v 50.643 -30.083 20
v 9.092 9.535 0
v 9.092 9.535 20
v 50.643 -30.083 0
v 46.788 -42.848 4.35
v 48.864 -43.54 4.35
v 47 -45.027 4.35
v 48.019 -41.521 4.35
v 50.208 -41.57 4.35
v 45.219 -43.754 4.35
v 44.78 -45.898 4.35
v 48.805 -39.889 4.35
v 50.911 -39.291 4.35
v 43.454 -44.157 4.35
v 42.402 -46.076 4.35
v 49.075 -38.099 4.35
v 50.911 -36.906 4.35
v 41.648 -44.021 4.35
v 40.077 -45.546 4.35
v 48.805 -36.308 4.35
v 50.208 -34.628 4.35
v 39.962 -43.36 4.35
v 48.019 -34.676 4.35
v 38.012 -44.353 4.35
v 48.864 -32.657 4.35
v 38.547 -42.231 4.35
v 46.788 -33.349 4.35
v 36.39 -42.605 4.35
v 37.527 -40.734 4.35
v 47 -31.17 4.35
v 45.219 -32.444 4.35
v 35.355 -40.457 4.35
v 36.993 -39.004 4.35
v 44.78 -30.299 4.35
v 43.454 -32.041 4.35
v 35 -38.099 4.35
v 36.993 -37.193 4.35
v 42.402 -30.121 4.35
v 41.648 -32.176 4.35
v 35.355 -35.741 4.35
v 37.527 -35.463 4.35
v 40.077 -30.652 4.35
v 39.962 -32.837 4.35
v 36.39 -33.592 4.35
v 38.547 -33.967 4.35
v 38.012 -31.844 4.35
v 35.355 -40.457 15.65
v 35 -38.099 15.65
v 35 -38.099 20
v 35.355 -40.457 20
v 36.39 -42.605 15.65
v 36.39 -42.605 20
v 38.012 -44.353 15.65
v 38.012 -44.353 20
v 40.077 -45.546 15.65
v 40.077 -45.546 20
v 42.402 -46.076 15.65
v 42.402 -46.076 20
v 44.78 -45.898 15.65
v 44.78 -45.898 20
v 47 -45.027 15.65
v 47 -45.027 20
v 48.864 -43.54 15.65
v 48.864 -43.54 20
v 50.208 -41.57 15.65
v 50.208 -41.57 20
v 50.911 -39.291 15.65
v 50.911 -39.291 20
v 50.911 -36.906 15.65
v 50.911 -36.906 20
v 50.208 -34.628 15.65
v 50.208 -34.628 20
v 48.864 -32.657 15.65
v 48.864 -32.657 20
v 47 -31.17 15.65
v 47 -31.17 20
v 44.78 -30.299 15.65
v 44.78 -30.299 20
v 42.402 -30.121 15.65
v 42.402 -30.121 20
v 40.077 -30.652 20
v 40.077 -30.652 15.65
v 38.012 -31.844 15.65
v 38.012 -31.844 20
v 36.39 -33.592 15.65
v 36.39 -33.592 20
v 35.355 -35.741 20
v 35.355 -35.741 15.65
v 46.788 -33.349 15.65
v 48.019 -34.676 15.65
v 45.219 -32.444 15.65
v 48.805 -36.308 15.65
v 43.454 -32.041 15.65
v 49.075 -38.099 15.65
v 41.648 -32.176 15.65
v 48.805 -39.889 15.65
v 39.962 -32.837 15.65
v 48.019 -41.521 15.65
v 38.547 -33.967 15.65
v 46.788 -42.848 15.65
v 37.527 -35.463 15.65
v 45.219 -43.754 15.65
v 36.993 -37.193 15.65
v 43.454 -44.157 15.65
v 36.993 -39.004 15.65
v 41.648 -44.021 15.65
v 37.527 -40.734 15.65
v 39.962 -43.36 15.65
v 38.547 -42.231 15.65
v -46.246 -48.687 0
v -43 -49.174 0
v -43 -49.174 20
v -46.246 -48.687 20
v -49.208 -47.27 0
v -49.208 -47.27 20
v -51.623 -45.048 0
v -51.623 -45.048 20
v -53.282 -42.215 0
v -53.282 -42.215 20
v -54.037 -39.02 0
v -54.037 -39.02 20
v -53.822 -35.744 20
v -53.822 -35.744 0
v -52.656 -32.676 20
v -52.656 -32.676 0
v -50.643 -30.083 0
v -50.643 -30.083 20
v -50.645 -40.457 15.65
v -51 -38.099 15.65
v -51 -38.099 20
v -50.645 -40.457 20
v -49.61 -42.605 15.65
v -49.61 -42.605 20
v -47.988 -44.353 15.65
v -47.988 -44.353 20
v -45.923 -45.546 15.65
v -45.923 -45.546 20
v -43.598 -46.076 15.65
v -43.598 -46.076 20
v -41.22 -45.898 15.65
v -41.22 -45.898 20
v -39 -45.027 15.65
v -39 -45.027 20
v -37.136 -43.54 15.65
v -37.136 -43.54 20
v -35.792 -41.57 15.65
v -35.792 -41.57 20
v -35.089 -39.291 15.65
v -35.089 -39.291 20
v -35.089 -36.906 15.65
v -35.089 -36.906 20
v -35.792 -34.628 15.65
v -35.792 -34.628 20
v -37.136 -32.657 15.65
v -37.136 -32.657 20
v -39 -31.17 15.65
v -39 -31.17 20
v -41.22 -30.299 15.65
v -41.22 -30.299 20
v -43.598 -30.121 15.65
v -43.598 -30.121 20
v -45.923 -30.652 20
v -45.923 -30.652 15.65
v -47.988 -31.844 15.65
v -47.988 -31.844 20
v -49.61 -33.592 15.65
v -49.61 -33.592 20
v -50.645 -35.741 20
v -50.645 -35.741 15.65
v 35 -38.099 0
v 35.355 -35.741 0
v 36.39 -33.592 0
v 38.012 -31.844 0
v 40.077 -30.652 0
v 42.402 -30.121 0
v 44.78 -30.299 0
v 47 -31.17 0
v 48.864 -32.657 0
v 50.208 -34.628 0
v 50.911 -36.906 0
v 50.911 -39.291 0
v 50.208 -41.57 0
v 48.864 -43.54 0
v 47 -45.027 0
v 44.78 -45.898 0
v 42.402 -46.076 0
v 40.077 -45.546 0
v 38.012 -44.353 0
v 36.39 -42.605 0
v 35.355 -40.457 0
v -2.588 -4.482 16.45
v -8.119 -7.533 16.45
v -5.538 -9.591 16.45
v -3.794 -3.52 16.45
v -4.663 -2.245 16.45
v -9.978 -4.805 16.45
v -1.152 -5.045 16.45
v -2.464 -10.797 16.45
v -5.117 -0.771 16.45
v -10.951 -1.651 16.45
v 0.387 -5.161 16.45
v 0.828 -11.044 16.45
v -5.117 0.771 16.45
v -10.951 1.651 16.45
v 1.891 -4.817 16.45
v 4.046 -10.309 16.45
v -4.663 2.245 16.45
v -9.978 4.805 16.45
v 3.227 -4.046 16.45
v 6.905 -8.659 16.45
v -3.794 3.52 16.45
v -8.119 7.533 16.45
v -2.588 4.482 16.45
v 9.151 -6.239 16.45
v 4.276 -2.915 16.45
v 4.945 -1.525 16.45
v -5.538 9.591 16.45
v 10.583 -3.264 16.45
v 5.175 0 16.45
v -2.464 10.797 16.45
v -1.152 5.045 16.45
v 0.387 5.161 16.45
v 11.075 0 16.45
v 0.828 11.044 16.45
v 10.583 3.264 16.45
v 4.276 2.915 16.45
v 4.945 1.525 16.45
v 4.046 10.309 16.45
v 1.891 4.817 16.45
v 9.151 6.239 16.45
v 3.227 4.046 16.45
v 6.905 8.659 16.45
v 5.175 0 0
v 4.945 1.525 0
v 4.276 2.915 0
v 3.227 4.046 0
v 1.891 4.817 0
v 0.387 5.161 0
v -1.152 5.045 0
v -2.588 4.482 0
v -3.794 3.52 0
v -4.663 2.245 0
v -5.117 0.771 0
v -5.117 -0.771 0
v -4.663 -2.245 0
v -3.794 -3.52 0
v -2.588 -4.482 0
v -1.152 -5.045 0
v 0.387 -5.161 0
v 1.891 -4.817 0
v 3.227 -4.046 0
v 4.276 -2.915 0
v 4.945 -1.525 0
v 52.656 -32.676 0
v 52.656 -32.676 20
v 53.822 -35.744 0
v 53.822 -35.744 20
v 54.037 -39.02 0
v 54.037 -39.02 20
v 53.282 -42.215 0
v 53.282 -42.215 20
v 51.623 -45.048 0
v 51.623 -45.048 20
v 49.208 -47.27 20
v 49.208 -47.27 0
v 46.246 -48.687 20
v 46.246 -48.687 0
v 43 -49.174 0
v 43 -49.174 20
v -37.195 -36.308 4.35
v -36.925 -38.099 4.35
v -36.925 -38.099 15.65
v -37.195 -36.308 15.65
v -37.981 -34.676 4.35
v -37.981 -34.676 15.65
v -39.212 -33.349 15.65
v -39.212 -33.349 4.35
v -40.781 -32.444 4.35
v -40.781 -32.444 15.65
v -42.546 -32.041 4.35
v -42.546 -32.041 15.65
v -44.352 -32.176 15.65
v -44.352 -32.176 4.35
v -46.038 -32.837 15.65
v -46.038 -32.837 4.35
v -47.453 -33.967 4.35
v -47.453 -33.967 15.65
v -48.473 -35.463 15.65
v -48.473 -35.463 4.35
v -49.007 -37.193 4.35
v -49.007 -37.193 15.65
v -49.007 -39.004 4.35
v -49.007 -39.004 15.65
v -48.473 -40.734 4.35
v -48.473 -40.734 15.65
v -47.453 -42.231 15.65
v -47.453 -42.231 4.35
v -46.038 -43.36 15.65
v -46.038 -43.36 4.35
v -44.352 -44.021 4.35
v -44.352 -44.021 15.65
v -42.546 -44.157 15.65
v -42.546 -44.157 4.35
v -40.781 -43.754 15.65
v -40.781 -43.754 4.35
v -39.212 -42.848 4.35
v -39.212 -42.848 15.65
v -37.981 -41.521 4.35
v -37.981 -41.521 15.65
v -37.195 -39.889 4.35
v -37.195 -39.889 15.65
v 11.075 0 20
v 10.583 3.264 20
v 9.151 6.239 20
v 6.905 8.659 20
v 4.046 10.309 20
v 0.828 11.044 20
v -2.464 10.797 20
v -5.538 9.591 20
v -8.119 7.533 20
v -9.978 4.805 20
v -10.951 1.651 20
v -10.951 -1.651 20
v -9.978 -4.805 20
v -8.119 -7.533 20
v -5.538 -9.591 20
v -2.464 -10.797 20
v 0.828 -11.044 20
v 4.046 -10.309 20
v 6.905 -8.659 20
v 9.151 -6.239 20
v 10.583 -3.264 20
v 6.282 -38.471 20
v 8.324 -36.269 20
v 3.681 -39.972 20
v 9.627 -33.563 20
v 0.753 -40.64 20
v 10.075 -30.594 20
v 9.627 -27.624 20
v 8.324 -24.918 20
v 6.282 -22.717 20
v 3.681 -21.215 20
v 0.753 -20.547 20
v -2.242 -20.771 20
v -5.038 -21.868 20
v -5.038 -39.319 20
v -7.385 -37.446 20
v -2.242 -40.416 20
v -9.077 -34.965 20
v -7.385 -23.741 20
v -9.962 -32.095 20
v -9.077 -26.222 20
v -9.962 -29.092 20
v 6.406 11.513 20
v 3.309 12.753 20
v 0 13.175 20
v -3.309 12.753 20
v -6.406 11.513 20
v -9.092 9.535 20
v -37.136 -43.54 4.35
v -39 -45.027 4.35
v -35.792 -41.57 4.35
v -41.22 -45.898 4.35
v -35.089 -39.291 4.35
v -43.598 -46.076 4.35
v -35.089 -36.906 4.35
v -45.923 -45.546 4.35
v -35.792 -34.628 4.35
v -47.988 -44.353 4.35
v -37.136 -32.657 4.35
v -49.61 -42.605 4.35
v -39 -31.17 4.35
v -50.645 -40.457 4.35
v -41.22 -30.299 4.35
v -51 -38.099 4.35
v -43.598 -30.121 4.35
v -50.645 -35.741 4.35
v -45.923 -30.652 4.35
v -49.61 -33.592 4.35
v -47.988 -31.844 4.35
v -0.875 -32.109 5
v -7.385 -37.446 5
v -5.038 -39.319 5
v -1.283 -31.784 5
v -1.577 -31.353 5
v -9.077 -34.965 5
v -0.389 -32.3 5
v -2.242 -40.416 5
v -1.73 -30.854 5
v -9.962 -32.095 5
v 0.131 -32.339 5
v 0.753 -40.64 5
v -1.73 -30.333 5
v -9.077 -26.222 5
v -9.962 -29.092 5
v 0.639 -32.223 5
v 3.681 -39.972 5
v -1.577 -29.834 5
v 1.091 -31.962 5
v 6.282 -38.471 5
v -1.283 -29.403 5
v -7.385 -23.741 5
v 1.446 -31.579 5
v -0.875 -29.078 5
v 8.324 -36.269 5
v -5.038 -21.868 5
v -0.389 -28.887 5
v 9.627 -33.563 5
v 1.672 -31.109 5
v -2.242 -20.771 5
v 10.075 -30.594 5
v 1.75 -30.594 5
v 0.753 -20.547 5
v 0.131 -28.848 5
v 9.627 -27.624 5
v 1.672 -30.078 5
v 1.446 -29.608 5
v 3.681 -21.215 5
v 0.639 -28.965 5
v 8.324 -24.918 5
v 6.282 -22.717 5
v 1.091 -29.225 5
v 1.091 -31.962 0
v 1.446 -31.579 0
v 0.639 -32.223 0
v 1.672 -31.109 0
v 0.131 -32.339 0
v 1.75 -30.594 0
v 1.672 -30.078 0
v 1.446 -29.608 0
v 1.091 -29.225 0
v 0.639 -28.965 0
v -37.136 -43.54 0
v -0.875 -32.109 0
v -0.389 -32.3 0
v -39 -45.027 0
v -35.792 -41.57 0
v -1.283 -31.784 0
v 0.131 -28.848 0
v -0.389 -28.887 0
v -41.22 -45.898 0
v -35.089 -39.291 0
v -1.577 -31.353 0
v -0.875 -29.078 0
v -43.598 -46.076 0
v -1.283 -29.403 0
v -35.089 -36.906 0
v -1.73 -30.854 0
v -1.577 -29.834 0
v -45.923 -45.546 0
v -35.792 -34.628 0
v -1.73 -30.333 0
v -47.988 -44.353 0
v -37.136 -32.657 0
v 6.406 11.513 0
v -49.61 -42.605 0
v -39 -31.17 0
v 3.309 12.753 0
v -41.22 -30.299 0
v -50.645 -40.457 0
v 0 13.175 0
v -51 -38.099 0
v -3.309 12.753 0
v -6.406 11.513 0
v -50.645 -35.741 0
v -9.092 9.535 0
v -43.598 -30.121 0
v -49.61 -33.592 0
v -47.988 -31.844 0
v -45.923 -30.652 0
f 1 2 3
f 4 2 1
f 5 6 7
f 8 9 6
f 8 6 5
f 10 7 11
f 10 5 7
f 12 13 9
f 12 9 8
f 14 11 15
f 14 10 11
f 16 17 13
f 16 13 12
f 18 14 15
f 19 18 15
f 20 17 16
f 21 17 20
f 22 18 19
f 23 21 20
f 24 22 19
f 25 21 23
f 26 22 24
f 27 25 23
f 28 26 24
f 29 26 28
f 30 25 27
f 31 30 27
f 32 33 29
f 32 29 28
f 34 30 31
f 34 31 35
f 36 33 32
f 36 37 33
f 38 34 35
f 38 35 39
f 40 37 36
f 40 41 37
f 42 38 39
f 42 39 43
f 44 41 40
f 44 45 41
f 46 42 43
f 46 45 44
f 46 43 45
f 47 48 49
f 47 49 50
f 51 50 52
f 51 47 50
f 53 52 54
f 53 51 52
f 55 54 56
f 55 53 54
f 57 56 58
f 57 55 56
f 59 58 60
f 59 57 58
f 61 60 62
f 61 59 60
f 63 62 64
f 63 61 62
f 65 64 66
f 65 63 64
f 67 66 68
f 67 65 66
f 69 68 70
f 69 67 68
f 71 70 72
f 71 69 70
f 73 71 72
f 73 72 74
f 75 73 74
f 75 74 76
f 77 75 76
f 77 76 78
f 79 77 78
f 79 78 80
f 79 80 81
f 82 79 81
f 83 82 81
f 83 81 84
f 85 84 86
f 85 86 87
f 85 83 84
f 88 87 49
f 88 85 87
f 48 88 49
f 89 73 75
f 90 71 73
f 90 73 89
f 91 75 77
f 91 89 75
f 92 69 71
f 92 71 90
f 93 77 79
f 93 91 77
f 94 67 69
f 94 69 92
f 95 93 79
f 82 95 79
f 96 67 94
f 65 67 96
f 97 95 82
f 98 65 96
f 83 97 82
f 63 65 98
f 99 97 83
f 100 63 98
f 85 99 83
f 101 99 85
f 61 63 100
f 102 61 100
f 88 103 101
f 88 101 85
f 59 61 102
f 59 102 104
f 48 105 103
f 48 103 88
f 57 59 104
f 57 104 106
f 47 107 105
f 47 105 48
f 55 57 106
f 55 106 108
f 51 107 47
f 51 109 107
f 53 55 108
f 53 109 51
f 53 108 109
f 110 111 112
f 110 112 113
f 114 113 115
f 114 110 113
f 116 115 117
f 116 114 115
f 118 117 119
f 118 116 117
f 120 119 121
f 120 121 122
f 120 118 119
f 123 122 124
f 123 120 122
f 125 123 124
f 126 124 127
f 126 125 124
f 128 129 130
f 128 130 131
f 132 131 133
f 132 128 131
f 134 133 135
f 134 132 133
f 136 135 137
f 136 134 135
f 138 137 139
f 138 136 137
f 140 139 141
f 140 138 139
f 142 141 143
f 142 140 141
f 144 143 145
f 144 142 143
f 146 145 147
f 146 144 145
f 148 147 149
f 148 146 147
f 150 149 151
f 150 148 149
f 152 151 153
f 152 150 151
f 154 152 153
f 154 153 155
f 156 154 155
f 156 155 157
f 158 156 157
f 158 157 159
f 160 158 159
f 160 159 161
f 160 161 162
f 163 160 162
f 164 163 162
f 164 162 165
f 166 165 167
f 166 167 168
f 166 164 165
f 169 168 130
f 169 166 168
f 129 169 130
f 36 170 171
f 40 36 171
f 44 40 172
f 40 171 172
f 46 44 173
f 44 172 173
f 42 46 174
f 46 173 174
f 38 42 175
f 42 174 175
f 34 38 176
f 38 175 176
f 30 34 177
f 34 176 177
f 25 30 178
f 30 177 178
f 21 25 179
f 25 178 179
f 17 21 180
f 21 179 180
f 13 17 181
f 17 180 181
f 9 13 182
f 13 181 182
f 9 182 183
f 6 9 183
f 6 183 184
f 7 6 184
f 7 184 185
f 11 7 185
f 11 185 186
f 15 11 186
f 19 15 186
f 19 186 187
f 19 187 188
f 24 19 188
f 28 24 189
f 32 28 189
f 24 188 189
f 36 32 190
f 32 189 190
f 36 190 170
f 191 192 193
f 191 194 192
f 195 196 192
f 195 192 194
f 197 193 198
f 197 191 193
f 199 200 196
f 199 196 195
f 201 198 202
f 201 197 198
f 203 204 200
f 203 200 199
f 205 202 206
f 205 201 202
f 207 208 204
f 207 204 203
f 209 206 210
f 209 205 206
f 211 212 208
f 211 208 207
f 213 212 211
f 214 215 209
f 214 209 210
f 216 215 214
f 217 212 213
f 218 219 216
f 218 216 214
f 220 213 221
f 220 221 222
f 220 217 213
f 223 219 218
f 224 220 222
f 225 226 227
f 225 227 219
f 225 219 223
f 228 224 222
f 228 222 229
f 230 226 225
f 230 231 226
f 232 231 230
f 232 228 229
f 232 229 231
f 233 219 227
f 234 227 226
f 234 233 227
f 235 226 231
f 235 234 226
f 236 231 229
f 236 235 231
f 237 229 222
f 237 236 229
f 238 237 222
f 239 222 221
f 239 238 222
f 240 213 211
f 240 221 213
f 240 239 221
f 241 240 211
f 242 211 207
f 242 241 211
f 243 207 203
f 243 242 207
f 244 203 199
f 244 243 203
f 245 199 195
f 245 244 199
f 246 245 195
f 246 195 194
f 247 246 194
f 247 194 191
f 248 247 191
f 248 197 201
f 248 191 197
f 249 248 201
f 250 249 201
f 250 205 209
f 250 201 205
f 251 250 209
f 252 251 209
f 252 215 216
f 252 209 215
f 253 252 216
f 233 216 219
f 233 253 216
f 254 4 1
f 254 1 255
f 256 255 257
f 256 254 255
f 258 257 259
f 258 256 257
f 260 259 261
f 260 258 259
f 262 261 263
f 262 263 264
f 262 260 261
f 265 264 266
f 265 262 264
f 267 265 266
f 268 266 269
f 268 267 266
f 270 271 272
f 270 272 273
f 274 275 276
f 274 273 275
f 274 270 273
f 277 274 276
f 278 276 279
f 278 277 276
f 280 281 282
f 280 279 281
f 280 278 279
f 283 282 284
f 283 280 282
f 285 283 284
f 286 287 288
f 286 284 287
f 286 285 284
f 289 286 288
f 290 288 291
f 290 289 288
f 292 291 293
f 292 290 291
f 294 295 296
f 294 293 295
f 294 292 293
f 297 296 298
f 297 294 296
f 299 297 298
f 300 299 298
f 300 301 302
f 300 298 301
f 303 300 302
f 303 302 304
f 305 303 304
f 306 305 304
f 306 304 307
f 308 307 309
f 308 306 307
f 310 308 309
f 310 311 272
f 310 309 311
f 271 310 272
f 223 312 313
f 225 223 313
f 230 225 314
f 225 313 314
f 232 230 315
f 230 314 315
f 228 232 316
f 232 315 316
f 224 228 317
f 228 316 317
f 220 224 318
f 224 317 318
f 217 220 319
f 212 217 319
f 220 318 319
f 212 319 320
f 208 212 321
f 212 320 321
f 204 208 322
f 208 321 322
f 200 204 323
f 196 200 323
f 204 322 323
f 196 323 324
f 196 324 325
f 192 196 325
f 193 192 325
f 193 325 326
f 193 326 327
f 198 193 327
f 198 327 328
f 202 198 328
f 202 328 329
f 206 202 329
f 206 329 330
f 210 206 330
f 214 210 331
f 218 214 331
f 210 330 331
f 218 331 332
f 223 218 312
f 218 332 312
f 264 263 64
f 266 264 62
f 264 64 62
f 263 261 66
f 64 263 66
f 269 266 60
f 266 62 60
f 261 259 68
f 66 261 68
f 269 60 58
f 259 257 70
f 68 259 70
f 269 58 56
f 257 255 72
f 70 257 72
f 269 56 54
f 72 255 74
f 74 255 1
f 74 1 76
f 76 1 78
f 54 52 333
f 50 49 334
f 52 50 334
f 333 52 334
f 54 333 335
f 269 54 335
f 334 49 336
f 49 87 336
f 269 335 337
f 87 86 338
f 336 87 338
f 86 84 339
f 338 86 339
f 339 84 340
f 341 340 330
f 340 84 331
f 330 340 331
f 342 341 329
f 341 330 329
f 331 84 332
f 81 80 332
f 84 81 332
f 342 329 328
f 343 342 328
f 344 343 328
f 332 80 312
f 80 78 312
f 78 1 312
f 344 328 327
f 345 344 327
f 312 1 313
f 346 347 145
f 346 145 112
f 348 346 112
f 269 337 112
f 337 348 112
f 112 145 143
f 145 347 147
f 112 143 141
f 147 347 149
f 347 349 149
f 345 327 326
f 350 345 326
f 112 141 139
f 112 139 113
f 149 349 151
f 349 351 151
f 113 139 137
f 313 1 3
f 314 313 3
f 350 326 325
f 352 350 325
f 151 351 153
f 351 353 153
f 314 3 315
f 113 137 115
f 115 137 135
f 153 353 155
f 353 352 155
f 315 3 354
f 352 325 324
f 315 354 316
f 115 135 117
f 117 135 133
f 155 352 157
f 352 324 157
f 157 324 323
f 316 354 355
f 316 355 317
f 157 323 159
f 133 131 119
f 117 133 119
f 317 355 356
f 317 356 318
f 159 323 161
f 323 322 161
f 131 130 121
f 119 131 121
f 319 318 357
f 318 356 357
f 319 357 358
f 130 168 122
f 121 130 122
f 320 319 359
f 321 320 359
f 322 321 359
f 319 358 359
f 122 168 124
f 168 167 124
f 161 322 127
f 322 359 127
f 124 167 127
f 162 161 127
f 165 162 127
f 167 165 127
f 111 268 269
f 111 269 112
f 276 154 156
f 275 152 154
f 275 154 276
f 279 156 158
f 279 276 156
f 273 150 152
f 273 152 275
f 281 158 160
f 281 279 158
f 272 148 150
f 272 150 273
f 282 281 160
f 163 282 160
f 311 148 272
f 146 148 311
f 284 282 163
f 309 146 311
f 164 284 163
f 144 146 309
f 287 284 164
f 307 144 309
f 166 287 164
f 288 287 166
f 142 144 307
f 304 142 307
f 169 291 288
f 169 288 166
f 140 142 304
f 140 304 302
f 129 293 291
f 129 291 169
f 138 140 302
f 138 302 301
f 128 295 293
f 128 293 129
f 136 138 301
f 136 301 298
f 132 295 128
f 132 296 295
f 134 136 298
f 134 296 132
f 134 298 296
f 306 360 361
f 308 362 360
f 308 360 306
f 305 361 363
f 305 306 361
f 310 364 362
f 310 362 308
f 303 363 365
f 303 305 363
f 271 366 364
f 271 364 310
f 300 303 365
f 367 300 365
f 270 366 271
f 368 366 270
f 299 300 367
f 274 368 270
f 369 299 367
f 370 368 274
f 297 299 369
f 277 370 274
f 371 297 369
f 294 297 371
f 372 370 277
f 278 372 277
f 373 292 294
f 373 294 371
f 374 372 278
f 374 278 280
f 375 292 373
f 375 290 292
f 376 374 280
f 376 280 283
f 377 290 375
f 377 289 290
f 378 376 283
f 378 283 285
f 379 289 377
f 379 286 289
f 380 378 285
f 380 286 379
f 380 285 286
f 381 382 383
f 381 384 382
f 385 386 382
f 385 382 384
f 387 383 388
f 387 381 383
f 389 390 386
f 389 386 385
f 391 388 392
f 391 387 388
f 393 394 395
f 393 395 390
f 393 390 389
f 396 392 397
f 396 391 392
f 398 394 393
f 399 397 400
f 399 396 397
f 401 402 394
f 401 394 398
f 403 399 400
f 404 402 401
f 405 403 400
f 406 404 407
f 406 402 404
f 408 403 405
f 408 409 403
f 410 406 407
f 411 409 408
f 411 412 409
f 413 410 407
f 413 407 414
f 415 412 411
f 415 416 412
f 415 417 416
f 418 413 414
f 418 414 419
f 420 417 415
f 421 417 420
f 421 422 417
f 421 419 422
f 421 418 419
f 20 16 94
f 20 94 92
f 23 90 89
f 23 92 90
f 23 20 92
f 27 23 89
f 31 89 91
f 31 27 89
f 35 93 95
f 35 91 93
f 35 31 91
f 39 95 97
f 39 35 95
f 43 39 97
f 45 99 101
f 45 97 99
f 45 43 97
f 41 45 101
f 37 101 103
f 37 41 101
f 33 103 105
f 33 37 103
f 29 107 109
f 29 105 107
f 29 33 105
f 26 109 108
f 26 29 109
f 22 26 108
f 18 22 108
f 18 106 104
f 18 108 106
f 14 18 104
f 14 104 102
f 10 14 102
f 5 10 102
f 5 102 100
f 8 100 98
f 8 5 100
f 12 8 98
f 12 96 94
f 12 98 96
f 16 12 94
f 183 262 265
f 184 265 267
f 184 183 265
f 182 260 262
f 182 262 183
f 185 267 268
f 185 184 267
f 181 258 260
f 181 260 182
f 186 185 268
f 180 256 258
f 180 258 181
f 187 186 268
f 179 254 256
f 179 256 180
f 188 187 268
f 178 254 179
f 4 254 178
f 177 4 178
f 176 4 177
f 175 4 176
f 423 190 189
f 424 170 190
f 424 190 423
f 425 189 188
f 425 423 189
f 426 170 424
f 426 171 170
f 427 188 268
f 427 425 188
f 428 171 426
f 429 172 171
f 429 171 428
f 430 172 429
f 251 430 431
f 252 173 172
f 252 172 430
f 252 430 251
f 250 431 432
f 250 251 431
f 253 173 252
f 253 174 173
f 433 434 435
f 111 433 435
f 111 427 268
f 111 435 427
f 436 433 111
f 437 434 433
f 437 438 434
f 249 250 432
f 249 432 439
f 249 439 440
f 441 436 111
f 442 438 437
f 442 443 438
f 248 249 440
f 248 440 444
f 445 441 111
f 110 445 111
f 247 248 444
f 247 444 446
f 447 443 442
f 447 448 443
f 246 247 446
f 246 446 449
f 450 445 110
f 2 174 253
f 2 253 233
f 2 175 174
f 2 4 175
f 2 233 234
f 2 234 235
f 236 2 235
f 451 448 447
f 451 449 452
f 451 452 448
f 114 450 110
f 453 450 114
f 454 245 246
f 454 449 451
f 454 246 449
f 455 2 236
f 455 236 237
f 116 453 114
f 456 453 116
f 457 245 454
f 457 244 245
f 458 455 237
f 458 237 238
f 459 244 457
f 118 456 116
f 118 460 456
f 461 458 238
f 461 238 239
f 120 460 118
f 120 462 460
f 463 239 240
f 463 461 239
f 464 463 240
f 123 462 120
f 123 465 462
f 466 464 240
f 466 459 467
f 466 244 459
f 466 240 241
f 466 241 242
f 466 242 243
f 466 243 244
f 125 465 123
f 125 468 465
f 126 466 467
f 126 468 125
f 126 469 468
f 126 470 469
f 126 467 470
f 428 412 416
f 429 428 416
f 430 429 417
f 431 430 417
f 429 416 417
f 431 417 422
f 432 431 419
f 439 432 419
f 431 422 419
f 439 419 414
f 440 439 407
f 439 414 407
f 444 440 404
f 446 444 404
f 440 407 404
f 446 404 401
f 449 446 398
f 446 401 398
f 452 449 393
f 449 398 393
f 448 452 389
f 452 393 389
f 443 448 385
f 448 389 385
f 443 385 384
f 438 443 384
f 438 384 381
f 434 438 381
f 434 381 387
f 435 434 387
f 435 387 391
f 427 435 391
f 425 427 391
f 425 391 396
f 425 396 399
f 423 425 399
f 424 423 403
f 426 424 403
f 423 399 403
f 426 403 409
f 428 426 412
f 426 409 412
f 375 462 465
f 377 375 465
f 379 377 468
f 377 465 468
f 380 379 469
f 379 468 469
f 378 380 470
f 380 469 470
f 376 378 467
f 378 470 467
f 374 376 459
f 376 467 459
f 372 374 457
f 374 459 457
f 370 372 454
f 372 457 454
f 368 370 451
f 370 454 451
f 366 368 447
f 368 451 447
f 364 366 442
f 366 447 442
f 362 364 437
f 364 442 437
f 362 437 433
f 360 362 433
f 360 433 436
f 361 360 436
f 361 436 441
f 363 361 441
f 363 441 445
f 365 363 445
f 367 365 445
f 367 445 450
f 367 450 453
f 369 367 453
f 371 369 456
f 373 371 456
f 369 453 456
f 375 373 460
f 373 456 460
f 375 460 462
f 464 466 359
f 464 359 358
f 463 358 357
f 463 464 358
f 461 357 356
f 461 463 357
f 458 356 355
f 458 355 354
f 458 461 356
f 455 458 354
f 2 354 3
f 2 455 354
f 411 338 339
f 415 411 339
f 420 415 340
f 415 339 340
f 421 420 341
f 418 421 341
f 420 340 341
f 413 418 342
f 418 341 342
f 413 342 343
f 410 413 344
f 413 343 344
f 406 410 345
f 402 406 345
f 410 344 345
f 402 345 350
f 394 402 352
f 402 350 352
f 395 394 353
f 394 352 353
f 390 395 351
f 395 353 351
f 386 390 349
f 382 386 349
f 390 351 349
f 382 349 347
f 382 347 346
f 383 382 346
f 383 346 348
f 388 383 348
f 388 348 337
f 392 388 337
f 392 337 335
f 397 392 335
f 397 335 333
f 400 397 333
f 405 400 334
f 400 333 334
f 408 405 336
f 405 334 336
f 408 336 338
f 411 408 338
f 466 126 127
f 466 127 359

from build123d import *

# Parameters (mm, degrees)
SKETCH1_R           = 5.175
SKETCH1_R_2         = 6.075
BOSS_EXTRUDE1_DEPTH = 20
SKETCH2_R           = 11.075
CUT_EXTRUDE1_DEPTH  = 3.55
SKETCH3_R           = 8
CUT_EXTRUDE2_DEPTH  = 4.35
CUT_EXTRUDE3_START  = -4.35
SKETCH4_R           = 8
CUT_EXTRUDE3_DEPTH  = 4.35
SKETCH5_R           = 10.075
CUT_EXTRUDE4_DEPTH  = 15
SKETCH6_R           = 1.75
CUT_EXTRUDE5_DEPTH  = 5


with BuildPart() as part:
    # Sketch1 → Boss-Extrude1 (new body)
    with BuildSketch(Plane.XY):
        with BuildLine():
            Line((9.091765785, 9.535219972), (50.642603876, -30.08321455))
            ThreePointArc((50.642603876, -30.08321455), (53.281680295, -42.214737327), (43, -49.173589213))
            Line((43, -49.173589213), (-43, -49.173589213))
            ThreePointArc((-43, -49.173589213), (-53.281680295, -42.214737327), (-50.642603876, -30.08321455))
            Line((-50.642603876, -30.08321455), (-9.091765785, 9.535219972))
            ThreePointArc((-9.091765785, 9.535219972), (0, 13.175), (9.091765785, 9.535219972))
        make_face()
        Circle(SKETCH1_R, mode=Mode.SUBTRACT)
        with Locations((43, -38.098589213)):
            Circle(SKETCH1_R_2, mode=Mode.SUBTRACT)
        with Locations((-43, -38.098589213)):
            Circle(SKETCH1_R_2, mode=Mode.SUBTRACT)
    extrude(amount=BOSS_EXTRUDE1_DEPTH)

    # Sketch2 → Cut-Extrude1 (cut)
    with BuildSketch(Plane.XY.offset(20)):
        Circle(SKETCH2_R)
    extrude(amount=-CUT_EXTRUDE1_DEPTH, mode=Mode.SUBTRACT)

    # Sketch3 → Cut-Extrude2 (cut)
    with BuildSketch(Plane(origin=(0, 0, 0), x_dir=(-1, 0, 0), z_dir=(0, 0, -1))):
        with Locations((43, -38.098589213)):
            Circle(SKETCH3_R)
        with Locations((-43, -38.098589213)):
            Circle(SKETCH3_R)
    extrude(amount=-CUT_EXTRUDE2_DEPTH, mode=Mode.SUBTRACT)

    # Sketch4 → Cut-Extrude3 (cut)
    with BuildSketch(Plane.XY.offset(20).offset(CUT_EXTRUDE3_START)):
        with Locations(Location((-43, -38.098589213, 0), (0, 0, 180))):
            Circle(SKETCH4_R)
        with Locations(Location((43, -38.098589213, 0), (0, 0, 180))):
            Circle(SKETCH4_R)
    extrude(amount=CUT_EXTRUDE3_DEPTH, mode=Mode.SUBTRACT)

    # Sketch5 → Cut-Extrude4 (cut)
    with BuildSketch(Plane.XY.offset(20)):
        with Locations((0, -30.593589213)):
            Circle(SKETCH5_R)
    extrude(amount=-CUT_EXTRUDE4_DEPTH, mode=Mode.SUBTRACT)

    # Sketch6 → Cut-Extrude5 (cut)
    with BuildSketch(Plane.XY.offset(5)):
        with Locations((0, -30.593589213)):
            Circle(SKETCH6_R)
    extrude(amount=-CUT_EXTRUDE5_DEPTH, mode=Mode.SUBTRACT)


solid = part.part
